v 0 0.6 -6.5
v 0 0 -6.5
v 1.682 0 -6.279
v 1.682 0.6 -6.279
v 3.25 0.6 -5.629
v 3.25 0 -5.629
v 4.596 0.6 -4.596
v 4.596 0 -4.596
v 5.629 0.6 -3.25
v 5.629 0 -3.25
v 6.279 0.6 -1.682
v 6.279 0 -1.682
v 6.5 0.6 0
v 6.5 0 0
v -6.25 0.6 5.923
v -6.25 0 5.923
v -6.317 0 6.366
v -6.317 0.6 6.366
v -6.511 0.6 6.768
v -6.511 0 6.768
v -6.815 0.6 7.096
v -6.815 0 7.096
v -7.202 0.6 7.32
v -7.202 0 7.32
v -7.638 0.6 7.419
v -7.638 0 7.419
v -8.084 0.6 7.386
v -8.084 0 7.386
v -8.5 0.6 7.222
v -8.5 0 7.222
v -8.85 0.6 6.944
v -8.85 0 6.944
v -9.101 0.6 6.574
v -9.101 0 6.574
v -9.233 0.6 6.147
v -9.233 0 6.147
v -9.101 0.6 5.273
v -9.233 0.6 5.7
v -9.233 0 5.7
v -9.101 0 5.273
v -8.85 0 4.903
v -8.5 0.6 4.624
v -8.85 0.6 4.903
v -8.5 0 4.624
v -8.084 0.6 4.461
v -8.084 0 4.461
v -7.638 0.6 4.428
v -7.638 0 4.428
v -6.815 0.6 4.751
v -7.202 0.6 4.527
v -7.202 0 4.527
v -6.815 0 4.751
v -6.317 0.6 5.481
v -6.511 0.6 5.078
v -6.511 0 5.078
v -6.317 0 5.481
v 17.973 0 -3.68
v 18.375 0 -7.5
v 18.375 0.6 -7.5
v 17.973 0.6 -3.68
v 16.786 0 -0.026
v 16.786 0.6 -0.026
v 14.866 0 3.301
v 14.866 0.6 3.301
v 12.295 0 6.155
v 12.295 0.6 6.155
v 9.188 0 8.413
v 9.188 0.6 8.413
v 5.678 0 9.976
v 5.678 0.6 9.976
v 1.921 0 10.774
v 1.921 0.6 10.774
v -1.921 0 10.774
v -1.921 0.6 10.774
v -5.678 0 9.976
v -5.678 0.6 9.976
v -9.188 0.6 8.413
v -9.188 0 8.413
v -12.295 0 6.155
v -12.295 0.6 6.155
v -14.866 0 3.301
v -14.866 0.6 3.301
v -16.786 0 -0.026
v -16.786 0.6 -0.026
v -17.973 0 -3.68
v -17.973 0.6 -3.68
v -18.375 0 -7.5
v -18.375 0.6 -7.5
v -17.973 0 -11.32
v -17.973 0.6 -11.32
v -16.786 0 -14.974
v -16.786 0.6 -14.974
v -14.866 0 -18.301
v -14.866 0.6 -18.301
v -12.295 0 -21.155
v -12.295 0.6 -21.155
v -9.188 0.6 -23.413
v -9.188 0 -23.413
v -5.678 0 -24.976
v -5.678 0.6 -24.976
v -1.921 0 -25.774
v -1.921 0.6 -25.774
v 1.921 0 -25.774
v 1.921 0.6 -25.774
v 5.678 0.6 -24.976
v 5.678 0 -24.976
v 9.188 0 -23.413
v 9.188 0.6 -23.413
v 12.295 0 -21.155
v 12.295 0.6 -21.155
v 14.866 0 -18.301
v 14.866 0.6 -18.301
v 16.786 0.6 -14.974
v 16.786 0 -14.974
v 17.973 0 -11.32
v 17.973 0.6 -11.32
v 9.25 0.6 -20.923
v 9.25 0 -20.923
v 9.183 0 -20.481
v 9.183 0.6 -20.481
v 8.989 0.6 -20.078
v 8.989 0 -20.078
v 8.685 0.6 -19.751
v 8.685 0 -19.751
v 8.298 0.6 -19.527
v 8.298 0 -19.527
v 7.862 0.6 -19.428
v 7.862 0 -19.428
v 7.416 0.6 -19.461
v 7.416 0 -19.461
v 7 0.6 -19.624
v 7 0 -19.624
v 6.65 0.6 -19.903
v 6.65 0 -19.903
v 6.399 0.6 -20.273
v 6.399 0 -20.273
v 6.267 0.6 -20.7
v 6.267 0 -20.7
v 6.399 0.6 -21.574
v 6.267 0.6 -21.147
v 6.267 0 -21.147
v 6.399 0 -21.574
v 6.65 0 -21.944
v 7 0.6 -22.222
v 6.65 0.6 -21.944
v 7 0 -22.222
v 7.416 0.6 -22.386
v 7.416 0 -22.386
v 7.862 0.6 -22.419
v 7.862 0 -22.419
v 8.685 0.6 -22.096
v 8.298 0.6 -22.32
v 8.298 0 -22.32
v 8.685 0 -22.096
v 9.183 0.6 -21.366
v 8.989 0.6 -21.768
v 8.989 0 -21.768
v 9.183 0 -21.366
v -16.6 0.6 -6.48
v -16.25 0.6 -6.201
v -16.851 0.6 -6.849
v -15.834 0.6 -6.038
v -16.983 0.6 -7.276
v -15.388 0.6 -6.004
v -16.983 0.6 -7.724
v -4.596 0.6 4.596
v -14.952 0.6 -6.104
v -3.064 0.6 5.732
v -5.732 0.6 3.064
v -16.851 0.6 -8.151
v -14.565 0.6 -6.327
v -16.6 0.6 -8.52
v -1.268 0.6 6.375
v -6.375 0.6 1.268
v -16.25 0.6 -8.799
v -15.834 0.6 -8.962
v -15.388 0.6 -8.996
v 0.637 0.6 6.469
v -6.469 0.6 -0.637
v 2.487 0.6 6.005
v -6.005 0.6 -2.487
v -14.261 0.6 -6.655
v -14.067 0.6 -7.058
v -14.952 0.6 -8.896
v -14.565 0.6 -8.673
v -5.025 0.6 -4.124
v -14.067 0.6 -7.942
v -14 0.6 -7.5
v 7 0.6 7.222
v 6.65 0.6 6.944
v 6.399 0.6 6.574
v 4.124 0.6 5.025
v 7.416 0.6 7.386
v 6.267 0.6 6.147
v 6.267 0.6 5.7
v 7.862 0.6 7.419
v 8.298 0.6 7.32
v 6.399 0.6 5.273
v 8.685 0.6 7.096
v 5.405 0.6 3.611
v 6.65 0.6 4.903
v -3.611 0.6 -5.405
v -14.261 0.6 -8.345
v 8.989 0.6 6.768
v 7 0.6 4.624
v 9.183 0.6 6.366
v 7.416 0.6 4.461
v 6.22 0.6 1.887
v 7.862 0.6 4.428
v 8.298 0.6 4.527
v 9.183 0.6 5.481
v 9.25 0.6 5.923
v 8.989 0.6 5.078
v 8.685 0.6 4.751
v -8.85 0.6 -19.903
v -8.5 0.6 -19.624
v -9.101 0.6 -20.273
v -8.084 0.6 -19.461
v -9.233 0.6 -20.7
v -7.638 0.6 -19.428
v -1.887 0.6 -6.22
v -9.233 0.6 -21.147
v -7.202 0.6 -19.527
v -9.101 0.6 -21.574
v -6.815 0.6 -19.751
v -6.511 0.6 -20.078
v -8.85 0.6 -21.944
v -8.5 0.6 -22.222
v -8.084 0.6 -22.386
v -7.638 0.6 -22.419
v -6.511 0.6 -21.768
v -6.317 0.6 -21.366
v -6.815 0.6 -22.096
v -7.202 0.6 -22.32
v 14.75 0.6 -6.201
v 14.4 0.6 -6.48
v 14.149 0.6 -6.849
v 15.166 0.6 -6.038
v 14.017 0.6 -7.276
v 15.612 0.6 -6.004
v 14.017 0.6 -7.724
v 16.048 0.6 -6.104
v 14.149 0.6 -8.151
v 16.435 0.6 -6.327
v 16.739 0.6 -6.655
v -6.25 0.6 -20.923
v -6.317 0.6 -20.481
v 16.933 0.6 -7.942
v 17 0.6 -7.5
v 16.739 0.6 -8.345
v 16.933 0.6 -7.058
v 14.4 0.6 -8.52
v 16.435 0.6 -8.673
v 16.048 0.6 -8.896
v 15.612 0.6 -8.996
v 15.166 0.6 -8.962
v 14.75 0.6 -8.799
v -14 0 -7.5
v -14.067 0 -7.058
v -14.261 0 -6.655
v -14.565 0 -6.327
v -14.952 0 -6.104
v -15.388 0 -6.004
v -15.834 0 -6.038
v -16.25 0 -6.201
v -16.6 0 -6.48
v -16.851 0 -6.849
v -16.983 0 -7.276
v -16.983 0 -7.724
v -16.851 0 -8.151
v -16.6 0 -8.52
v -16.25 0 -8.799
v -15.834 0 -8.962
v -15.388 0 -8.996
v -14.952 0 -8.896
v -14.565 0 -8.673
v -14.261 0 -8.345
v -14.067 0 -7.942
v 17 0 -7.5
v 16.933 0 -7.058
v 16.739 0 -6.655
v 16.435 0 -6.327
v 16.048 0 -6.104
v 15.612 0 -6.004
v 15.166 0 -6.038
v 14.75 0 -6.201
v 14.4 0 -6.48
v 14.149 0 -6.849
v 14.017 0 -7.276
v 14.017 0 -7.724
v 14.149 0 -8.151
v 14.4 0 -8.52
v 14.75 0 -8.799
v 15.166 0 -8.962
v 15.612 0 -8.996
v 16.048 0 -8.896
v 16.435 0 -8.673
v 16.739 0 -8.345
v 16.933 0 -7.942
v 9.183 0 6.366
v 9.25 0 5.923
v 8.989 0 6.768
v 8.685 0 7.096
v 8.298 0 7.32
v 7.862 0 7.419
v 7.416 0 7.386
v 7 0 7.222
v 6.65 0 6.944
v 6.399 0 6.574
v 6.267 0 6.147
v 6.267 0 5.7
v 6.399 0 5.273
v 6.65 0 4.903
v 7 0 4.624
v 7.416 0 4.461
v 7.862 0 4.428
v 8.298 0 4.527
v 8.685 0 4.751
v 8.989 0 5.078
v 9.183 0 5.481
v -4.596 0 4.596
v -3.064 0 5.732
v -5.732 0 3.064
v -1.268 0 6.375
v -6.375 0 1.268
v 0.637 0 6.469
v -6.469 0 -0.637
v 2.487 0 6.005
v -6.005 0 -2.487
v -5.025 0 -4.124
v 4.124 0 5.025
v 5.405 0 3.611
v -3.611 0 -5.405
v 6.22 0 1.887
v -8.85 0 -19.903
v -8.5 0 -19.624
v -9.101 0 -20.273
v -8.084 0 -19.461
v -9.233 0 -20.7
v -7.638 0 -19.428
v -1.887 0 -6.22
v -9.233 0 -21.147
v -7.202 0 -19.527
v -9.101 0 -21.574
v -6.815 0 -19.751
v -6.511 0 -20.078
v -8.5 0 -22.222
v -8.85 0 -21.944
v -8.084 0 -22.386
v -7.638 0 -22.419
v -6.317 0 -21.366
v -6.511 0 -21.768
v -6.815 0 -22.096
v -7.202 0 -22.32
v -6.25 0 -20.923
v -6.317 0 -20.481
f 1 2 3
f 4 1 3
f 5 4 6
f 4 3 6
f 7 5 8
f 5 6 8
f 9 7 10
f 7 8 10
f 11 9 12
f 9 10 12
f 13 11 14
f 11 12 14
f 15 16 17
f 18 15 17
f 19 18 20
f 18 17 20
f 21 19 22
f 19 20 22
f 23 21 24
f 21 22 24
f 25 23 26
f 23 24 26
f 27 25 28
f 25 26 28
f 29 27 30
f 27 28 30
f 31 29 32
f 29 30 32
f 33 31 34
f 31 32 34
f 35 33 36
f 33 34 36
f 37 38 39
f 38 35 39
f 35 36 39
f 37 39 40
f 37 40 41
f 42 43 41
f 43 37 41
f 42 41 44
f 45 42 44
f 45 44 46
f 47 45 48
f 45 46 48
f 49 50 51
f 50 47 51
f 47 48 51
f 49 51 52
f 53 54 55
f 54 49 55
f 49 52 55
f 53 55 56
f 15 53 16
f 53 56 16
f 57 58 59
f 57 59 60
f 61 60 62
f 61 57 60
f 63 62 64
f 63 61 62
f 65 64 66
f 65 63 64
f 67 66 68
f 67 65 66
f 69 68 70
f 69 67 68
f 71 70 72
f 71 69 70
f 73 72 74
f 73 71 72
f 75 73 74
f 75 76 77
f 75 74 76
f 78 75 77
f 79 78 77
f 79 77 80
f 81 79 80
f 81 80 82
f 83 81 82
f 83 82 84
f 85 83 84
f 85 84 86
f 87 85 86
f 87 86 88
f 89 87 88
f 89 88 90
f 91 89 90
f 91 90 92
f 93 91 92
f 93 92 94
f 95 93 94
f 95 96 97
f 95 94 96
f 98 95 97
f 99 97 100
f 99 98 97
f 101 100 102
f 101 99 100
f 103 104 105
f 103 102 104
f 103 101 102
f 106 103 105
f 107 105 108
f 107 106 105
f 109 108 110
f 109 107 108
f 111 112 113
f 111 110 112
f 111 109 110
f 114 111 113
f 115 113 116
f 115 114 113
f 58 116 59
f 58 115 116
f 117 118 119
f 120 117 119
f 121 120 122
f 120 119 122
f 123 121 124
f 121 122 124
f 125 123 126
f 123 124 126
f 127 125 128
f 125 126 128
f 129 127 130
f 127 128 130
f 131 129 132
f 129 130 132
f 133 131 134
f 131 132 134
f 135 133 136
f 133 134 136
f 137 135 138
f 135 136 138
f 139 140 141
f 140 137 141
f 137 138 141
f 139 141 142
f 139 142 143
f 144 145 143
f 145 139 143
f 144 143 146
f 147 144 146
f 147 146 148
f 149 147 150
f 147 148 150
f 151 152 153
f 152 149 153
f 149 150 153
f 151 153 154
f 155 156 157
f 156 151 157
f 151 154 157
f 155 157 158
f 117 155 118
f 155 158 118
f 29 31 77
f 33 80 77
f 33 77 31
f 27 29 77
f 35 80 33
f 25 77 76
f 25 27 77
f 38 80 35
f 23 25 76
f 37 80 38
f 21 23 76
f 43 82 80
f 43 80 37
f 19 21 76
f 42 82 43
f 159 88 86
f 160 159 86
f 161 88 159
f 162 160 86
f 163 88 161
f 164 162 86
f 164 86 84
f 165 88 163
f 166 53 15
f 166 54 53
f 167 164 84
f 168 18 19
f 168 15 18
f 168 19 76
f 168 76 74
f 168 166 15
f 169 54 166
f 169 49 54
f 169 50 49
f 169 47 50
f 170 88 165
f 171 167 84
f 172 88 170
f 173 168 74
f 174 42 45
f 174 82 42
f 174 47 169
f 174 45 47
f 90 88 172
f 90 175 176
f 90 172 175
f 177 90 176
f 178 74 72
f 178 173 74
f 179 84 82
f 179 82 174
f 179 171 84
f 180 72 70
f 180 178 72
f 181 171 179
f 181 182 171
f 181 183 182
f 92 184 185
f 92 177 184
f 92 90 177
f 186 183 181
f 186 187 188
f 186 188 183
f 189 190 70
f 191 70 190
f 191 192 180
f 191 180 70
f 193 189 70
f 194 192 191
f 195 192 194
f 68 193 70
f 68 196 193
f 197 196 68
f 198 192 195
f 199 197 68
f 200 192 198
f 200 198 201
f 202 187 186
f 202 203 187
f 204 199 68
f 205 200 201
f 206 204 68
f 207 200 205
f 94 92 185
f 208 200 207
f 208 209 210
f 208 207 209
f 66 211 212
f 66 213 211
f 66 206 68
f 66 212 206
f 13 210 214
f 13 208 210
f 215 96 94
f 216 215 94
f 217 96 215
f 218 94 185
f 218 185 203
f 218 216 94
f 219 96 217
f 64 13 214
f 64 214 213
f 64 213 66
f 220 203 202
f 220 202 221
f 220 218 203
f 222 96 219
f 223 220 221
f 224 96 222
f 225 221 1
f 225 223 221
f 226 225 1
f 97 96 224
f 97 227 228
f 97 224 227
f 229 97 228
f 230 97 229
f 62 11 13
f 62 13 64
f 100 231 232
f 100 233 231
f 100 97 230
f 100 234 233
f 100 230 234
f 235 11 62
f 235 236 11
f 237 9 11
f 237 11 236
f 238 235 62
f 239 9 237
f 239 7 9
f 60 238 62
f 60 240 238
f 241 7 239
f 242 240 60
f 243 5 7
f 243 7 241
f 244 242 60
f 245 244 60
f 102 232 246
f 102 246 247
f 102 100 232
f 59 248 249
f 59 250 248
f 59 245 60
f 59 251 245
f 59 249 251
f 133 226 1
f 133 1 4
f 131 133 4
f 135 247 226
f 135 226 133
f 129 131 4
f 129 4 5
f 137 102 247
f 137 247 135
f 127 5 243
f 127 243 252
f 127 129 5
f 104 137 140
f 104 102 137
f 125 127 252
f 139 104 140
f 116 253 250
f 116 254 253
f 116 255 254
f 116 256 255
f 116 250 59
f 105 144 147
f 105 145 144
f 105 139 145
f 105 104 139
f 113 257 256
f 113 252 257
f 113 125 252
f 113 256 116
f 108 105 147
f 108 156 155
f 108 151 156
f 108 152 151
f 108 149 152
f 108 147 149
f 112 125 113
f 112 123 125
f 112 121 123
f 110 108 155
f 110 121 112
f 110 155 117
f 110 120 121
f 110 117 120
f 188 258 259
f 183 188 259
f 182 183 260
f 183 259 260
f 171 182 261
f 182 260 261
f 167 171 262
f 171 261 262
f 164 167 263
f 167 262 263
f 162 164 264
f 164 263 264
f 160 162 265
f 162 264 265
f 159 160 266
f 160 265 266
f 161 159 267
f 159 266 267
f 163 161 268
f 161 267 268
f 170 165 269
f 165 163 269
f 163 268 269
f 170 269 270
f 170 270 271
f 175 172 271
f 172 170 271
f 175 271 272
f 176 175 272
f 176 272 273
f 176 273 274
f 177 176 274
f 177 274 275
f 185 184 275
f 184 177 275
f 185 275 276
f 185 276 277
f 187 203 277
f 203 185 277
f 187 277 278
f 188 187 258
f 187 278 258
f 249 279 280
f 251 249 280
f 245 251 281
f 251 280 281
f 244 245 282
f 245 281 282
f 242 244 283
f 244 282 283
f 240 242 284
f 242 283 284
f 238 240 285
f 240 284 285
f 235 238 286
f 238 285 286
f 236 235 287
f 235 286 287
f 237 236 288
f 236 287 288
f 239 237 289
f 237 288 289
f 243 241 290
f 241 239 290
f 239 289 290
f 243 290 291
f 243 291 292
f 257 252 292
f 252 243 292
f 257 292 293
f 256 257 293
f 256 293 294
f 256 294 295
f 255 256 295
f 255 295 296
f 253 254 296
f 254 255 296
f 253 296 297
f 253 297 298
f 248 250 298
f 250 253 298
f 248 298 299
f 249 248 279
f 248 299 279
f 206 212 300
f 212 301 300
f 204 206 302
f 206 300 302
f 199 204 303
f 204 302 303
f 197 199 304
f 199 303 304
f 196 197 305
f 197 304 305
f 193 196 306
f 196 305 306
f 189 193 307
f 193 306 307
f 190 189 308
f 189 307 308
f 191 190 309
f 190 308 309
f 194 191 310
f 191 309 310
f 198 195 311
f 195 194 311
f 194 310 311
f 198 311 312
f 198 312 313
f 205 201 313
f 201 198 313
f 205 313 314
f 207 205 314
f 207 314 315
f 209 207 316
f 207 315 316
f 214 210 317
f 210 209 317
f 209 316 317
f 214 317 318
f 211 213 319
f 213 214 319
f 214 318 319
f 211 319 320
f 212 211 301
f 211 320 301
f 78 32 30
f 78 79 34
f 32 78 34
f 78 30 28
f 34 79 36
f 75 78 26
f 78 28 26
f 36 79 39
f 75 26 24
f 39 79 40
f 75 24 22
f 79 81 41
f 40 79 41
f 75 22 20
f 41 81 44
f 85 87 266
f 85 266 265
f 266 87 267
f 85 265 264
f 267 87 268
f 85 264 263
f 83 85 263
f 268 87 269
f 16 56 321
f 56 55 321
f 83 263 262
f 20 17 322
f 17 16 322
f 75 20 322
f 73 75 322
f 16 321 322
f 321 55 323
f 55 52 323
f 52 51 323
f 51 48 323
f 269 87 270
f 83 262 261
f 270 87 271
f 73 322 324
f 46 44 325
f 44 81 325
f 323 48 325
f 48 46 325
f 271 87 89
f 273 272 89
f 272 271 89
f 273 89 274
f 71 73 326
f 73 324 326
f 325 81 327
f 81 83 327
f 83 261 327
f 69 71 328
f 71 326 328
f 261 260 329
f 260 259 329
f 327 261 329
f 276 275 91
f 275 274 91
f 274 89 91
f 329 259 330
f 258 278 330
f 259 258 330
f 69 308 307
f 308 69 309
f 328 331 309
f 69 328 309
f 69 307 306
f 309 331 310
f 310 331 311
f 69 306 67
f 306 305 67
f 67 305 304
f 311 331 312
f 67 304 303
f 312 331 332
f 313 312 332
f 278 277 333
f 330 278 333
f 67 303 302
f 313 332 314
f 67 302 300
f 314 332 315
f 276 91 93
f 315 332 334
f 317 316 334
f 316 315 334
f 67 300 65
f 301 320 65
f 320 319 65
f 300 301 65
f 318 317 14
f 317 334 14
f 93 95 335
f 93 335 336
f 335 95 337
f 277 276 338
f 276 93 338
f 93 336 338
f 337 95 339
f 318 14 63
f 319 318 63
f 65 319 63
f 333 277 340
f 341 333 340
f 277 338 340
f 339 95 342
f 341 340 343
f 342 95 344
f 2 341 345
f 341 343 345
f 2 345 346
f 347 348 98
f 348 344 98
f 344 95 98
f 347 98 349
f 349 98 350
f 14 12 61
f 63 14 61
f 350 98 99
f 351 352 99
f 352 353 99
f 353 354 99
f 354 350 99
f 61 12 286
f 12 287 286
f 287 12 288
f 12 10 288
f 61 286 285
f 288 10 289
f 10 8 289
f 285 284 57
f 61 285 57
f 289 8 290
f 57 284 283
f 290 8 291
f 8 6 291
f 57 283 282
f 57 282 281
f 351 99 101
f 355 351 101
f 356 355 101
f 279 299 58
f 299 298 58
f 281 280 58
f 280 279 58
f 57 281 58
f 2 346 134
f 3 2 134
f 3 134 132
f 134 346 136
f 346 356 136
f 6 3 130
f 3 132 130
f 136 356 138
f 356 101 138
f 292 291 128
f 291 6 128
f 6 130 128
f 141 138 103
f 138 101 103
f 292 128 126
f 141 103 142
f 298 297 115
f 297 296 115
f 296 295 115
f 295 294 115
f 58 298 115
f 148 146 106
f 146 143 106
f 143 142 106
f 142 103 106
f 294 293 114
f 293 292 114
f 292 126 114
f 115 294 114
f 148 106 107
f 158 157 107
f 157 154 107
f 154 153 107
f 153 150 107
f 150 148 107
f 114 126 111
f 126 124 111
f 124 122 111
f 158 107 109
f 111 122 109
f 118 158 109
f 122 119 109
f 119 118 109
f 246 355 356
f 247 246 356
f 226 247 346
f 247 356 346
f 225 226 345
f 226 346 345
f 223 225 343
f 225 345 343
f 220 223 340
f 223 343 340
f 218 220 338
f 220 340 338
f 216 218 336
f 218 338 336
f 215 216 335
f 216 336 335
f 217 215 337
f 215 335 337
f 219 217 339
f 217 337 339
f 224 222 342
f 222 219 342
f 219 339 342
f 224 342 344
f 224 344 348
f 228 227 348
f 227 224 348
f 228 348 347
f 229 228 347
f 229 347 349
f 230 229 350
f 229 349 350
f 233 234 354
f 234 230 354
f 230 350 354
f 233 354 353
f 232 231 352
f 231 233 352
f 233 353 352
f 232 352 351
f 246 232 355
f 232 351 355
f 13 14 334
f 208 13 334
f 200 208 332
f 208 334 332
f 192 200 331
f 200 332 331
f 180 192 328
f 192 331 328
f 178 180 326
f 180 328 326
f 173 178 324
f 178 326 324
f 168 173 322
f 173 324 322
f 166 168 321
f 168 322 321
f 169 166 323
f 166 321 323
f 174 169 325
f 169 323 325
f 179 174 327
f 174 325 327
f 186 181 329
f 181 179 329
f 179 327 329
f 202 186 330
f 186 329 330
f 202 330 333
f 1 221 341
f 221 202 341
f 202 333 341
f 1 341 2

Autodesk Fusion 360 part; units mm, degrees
sketch "Sketch1" plane through (0, 0, 0) normal (0, 1, 0) x (1, 0, 0)
  circle A0 centre (0, 0) radius 6.5
  circle A1 centre (0, 7.5) radius 18.375
  line L0 (0, 0) -> (0, 7.5)
  circle A2 centre (0, 7.5) radius 15.5 construction
  line L1 (-26.0681, 7.5) -> (26.0681, 7.5) construction
  circle A3 centre (15.5, 7.5) radius 1.5
  circle A4 centre (7.75, 20.9234) radius 1.5
  circle A5 centre (-7.75, 20.9234) radius 1.5
  circle A6 centre (-15.5, 7.5) radius 1.5
  circle A7 centre (-7.75, -5.9234) radius 1.5
  circle A8 centre (7.75, -5.9234) radius 1.5
  line L2 (-19.977, -10.875) -> (20.9733, -10.875) construction
  dimension "d1" = 13
  dimension "d2" = 36.75
  dimension "d3" = 7.5
  dimension "d4" = 31
  dimension "d5" = 3
  dimension "d7" = 360
  dimension "d10" = 10.875
extrude "Extrude1" add sketch "Sketch1" along normal blind 0.6
